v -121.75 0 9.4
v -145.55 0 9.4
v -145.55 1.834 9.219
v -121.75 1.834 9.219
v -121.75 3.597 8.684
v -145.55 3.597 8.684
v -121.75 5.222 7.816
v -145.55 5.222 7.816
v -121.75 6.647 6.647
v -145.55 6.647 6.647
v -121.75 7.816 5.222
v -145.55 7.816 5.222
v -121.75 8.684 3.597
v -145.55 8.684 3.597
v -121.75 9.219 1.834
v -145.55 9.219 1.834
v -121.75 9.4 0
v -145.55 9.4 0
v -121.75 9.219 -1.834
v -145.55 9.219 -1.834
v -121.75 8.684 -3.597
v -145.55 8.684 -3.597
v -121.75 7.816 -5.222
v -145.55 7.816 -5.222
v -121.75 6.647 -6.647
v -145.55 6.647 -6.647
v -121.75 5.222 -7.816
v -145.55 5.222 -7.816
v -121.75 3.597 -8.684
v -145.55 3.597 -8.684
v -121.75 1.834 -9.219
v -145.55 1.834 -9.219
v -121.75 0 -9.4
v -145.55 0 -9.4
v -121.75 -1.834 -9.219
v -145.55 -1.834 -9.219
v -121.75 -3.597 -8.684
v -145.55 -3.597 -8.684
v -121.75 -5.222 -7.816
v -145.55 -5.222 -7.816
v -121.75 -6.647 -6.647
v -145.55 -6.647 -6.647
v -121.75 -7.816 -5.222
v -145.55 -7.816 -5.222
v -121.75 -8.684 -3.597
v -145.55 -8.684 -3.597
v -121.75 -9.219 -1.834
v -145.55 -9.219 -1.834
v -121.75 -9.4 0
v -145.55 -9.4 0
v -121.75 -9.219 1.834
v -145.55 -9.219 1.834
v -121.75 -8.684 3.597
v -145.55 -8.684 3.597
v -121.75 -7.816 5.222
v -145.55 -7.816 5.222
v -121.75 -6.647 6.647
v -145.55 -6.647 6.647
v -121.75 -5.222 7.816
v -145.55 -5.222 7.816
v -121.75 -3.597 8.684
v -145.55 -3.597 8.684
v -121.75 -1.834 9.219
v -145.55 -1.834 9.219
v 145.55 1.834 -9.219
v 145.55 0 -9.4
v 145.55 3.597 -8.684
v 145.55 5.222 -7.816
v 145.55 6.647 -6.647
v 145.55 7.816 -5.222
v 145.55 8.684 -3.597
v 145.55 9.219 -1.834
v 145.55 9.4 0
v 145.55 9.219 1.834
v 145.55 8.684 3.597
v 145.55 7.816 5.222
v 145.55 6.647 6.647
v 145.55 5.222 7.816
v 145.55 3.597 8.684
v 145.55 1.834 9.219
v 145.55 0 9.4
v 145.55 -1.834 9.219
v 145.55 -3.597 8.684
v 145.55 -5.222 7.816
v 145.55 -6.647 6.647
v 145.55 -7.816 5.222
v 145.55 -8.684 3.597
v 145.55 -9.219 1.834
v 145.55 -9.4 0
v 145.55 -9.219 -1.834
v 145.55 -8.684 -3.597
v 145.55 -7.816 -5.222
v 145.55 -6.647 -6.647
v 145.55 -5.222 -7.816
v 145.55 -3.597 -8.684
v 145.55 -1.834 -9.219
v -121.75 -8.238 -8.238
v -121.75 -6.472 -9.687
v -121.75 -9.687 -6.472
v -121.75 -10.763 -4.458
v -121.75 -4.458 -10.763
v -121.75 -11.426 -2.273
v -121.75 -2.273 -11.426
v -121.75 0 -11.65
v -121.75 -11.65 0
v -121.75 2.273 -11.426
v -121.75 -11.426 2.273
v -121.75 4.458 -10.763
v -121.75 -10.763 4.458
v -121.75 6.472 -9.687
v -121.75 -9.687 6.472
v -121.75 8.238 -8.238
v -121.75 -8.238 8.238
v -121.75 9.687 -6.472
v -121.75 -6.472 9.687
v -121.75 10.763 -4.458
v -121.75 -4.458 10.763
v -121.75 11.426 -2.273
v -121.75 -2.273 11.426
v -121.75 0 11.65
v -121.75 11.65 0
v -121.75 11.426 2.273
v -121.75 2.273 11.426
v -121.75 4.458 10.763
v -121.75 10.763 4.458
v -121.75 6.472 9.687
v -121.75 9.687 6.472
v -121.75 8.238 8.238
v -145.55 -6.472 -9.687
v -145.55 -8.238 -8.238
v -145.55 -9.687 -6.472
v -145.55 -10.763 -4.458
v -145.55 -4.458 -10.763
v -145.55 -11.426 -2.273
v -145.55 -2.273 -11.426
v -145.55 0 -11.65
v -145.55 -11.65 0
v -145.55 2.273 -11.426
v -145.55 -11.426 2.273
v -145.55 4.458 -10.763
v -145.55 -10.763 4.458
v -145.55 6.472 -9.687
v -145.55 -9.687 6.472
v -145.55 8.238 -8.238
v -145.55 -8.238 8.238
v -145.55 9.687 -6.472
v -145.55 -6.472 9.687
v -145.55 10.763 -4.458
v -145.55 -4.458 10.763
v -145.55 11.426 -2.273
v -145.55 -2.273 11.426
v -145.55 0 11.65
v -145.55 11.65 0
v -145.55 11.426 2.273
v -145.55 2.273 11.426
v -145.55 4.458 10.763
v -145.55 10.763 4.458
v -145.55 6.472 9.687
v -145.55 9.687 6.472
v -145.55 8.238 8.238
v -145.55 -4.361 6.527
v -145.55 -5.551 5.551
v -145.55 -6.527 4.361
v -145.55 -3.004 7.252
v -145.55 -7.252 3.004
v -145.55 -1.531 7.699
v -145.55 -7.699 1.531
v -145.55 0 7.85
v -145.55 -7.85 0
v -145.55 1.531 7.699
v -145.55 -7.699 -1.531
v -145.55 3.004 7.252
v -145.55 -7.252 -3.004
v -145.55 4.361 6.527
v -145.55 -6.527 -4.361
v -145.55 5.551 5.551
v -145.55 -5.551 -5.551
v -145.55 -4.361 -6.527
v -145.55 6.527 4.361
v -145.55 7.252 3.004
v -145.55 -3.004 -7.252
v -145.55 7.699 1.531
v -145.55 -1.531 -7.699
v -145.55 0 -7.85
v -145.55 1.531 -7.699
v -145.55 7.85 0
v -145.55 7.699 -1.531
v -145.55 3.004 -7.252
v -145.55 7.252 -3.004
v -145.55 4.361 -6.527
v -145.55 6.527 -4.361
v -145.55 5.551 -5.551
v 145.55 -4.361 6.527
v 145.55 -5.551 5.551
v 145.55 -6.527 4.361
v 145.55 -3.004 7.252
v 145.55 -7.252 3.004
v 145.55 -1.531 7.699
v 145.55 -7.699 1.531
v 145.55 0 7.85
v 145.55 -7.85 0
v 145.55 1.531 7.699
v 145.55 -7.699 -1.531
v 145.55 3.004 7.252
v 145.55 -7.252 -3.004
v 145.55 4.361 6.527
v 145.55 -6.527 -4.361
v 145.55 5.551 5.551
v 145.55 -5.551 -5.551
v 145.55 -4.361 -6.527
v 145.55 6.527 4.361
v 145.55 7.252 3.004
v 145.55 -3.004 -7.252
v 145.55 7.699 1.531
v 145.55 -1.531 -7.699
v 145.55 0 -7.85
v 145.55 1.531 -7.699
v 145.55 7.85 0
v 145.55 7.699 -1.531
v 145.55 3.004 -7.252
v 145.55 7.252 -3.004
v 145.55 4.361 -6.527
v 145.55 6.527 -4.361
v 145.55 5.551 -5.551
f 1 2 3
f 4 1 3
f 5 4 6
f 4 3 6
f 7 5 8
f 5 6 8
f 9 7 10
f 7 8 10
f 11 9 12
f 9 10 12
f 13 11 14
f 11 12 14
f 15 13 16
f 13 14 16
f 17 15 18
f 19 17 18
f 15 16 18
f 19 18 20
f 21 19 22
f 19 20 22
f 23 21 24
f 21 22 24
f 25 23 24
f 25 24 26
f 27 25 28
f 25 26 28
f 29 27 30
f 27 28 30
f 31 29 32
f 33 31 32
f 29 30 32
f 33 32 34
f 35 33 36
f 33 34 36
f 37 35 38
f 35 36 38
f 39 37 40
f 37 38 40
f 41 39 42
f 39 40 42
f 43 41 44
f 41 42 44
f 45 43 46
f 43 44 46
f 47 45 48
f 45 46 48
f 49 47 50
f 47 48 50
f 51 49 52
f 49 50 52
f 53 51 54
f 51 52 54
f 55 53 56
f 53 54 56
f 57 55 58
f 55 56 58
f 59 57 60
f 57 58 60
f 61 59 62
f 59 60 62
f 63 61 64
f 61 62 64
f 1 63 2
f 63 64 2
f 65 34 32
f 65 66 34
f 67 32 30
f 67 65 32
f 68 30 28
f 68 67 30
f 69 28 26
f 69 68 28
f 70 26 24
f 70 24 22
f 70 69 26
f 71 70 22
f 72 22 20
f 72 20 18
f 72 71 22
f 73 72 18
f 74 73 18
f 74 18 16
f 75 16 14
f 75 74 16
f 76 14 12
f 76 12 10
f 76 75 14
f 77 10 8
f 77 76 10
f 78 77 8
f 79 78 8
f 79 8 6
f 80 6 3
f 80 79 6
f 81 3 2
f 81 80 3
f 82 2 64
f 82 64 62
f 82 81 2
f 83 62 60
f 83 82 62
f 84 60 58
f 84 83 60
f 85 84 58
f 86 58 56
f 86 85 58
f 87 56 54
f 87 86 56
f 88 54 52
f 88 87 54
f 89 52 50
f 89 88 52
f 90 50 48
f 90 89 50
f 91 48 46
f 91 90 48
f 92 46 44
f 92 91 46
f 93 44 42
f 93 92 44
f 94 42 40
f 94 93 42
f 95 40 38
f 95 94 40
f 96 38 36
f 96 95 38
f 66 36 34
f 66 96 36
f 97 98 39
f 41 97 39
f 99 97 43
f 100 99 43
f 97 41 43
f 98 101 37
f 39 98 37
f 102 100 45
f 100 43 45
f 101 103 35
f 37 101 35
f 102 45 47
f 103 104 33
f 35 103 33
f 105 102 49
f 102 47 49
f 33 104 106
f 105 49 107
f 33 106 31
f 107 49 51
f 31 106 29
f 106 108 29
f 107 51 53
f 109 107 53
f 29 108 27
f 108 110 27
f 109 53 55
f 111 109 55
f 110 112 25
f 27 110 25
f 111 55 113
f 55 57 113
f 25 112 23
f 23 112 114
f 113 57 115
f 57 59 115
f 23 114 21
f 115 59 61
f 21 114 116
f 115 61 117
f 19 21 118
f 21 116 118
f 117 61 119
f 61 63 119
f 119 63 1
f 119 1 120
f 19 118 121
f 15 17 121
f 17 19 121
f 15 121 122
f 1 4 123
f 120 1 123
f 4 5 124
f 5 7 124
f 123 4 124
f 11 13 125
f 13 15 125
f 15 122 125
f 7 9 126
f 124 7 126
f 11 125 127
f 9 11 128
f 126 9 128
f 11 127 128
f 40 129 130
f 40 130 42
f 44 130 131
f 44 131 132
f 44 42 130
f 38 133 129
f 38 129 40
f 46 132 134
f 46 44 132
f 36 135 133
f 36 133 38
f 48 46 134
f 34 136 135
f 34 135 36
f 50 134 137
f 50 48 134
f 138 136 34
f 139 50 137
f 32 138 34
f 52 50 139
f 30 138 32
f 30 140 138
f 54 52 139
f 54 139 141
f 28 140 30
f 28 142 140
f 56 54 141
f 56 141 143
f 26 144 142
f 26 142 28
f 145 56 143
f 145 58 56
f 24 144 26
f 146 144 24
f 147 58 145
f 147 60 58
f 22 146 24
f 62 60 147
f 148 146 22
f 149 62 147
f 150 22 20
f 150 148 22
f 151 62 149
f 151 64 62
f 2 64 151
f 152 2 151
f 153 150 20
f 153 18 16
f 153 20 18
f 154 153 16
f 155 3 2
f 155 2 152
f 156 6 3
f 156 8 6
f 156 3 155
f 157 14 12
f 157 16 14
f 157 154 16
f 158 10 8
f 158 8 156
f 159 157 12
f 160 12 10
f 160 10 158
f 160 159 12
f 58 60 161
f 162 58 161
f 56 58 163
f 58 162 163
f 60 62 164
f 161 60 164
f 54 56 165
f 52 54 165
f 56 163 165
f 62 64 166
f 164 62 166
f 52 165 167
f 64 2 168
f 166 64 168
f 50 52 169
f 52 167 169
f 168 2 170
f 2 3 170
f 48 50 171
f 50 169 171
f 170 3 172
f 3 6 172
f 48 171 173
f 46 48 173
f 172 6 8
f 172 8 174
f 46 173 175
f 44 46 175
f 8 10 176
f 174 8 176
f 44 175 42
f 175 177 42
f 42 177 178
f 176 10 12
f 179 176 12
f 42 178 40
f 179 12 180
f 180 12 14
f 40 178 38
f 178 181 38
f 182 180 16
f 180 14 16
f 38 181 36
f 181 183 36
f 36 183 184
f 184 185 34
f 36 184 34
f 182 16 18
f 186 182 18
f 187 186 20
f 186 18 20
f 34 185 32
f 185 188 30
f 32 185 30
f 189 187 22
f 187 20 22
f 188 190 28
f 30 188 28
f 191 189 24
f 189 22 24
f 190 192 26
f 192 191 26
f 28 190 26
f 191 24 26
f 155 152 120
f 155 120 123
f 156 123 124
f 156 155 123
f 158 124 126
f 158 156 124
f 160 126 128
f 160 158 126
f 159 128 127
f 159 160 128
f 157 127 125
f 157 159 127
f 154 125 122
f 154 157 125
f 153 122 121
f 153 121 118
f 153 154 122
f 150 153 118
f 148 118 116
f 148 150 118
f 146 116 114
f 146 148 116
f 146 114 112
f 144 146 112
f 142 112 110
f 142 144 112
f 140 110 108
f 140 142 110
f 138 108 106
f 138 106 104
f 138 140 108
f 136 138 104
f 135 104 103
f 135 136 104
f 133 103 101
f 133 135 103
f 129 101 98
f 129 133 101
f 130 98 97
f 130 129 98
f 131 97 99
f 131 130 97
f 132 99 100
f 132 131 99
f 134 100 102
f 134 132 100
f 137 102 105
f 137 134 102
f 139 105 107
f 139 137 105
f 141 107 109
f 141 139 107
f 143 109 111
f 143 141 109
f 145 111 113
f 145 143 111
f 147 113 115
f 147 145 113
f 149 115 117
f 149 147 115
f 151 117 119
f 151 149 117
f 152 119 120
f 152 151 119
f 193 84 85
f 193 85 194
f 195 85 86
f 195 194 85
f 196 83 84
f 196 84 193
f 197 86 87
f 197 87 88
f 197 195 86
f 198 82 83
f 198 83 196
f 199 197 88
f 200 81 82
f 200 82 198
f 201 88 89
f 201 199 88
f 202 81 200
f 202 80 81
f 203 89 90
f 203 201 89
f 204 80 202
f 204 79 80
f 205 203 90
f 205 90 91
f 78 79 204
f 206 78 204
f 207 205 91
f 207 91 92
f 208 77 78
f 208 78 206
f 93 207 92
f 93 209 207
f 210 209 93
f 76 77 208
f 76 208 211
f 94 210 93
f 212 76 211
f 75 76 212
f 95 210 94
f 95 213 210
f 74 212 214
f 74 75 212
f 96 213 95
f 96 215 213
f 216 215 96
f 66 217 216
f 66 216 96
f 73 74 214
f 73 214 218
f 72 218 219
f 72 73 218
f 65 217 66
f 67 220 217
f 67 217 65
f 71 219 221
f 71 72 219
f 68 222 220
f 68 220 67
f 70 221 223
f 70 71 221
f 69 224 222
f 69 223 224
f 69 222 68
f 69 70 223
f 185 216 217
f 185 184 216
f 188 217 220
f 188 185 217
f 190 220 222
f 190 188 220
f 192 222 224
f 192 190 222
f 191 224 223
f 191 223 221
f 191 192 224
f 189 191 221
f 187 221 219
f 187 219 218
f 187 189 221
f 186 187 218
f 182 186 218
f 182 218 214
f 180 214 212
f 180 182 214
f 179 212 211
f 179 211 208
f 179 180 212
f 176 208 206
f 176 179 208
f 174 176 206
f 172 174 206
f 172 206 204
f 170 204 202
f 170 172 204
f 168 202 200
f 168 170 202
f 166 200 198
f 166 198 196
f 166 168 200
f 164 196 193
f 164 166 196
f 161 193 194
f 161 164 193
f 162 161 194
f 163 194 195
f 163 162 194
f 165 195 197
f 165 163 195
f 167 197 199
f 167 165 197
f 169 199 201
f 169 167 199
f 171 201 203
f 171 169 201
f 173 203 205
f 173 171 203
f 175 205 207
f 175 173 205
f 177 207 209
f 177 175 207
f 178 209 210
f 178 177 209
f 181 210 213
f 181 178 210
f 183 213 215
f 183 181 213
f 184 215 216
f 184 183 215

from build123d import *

# Parameters (mm, degrees)
SKETCH1_R           = 9.4
SKETCH1_R_2         = 7.85
BOSS_EXTRUDE1_DEPTH = 145.55
SKETCH2_R           = 11.65
SKETCH2_R_2         = 9.4
BOSS_EXTRUDE2_DEPTH = 23.8


with BuildPart() as part:
    # Sketch1 → Boss-Extrude1 (new, symmetric)
    with BuildSketch(Plane(origin=(0, 0, 0), x_dir=(0, 0, -1), z_dir=(1, 0, 0))):
        Circle(SKETCH1_R)
        Circle(SKETCH1_R_2, mode=Mode.SUBTRACT)
    extrude(amount=BOSS_EXTRUDE1_DEPTH, both=True)


with BuildPart() as body_2:
    # Sketch2 → Boss-Extrude2 (new body)
    with BuildSketch(Plane.ZY.offset(145.55)):
        Circle(SKETCH2_R)
        Circle(SKETCH2_R_2, mode=Mode.SUBTRACT)
    extrude(amount=-BOSS_EXTRUDE2_DEPTH)


solid = Compound([part.part, body_2.part])
